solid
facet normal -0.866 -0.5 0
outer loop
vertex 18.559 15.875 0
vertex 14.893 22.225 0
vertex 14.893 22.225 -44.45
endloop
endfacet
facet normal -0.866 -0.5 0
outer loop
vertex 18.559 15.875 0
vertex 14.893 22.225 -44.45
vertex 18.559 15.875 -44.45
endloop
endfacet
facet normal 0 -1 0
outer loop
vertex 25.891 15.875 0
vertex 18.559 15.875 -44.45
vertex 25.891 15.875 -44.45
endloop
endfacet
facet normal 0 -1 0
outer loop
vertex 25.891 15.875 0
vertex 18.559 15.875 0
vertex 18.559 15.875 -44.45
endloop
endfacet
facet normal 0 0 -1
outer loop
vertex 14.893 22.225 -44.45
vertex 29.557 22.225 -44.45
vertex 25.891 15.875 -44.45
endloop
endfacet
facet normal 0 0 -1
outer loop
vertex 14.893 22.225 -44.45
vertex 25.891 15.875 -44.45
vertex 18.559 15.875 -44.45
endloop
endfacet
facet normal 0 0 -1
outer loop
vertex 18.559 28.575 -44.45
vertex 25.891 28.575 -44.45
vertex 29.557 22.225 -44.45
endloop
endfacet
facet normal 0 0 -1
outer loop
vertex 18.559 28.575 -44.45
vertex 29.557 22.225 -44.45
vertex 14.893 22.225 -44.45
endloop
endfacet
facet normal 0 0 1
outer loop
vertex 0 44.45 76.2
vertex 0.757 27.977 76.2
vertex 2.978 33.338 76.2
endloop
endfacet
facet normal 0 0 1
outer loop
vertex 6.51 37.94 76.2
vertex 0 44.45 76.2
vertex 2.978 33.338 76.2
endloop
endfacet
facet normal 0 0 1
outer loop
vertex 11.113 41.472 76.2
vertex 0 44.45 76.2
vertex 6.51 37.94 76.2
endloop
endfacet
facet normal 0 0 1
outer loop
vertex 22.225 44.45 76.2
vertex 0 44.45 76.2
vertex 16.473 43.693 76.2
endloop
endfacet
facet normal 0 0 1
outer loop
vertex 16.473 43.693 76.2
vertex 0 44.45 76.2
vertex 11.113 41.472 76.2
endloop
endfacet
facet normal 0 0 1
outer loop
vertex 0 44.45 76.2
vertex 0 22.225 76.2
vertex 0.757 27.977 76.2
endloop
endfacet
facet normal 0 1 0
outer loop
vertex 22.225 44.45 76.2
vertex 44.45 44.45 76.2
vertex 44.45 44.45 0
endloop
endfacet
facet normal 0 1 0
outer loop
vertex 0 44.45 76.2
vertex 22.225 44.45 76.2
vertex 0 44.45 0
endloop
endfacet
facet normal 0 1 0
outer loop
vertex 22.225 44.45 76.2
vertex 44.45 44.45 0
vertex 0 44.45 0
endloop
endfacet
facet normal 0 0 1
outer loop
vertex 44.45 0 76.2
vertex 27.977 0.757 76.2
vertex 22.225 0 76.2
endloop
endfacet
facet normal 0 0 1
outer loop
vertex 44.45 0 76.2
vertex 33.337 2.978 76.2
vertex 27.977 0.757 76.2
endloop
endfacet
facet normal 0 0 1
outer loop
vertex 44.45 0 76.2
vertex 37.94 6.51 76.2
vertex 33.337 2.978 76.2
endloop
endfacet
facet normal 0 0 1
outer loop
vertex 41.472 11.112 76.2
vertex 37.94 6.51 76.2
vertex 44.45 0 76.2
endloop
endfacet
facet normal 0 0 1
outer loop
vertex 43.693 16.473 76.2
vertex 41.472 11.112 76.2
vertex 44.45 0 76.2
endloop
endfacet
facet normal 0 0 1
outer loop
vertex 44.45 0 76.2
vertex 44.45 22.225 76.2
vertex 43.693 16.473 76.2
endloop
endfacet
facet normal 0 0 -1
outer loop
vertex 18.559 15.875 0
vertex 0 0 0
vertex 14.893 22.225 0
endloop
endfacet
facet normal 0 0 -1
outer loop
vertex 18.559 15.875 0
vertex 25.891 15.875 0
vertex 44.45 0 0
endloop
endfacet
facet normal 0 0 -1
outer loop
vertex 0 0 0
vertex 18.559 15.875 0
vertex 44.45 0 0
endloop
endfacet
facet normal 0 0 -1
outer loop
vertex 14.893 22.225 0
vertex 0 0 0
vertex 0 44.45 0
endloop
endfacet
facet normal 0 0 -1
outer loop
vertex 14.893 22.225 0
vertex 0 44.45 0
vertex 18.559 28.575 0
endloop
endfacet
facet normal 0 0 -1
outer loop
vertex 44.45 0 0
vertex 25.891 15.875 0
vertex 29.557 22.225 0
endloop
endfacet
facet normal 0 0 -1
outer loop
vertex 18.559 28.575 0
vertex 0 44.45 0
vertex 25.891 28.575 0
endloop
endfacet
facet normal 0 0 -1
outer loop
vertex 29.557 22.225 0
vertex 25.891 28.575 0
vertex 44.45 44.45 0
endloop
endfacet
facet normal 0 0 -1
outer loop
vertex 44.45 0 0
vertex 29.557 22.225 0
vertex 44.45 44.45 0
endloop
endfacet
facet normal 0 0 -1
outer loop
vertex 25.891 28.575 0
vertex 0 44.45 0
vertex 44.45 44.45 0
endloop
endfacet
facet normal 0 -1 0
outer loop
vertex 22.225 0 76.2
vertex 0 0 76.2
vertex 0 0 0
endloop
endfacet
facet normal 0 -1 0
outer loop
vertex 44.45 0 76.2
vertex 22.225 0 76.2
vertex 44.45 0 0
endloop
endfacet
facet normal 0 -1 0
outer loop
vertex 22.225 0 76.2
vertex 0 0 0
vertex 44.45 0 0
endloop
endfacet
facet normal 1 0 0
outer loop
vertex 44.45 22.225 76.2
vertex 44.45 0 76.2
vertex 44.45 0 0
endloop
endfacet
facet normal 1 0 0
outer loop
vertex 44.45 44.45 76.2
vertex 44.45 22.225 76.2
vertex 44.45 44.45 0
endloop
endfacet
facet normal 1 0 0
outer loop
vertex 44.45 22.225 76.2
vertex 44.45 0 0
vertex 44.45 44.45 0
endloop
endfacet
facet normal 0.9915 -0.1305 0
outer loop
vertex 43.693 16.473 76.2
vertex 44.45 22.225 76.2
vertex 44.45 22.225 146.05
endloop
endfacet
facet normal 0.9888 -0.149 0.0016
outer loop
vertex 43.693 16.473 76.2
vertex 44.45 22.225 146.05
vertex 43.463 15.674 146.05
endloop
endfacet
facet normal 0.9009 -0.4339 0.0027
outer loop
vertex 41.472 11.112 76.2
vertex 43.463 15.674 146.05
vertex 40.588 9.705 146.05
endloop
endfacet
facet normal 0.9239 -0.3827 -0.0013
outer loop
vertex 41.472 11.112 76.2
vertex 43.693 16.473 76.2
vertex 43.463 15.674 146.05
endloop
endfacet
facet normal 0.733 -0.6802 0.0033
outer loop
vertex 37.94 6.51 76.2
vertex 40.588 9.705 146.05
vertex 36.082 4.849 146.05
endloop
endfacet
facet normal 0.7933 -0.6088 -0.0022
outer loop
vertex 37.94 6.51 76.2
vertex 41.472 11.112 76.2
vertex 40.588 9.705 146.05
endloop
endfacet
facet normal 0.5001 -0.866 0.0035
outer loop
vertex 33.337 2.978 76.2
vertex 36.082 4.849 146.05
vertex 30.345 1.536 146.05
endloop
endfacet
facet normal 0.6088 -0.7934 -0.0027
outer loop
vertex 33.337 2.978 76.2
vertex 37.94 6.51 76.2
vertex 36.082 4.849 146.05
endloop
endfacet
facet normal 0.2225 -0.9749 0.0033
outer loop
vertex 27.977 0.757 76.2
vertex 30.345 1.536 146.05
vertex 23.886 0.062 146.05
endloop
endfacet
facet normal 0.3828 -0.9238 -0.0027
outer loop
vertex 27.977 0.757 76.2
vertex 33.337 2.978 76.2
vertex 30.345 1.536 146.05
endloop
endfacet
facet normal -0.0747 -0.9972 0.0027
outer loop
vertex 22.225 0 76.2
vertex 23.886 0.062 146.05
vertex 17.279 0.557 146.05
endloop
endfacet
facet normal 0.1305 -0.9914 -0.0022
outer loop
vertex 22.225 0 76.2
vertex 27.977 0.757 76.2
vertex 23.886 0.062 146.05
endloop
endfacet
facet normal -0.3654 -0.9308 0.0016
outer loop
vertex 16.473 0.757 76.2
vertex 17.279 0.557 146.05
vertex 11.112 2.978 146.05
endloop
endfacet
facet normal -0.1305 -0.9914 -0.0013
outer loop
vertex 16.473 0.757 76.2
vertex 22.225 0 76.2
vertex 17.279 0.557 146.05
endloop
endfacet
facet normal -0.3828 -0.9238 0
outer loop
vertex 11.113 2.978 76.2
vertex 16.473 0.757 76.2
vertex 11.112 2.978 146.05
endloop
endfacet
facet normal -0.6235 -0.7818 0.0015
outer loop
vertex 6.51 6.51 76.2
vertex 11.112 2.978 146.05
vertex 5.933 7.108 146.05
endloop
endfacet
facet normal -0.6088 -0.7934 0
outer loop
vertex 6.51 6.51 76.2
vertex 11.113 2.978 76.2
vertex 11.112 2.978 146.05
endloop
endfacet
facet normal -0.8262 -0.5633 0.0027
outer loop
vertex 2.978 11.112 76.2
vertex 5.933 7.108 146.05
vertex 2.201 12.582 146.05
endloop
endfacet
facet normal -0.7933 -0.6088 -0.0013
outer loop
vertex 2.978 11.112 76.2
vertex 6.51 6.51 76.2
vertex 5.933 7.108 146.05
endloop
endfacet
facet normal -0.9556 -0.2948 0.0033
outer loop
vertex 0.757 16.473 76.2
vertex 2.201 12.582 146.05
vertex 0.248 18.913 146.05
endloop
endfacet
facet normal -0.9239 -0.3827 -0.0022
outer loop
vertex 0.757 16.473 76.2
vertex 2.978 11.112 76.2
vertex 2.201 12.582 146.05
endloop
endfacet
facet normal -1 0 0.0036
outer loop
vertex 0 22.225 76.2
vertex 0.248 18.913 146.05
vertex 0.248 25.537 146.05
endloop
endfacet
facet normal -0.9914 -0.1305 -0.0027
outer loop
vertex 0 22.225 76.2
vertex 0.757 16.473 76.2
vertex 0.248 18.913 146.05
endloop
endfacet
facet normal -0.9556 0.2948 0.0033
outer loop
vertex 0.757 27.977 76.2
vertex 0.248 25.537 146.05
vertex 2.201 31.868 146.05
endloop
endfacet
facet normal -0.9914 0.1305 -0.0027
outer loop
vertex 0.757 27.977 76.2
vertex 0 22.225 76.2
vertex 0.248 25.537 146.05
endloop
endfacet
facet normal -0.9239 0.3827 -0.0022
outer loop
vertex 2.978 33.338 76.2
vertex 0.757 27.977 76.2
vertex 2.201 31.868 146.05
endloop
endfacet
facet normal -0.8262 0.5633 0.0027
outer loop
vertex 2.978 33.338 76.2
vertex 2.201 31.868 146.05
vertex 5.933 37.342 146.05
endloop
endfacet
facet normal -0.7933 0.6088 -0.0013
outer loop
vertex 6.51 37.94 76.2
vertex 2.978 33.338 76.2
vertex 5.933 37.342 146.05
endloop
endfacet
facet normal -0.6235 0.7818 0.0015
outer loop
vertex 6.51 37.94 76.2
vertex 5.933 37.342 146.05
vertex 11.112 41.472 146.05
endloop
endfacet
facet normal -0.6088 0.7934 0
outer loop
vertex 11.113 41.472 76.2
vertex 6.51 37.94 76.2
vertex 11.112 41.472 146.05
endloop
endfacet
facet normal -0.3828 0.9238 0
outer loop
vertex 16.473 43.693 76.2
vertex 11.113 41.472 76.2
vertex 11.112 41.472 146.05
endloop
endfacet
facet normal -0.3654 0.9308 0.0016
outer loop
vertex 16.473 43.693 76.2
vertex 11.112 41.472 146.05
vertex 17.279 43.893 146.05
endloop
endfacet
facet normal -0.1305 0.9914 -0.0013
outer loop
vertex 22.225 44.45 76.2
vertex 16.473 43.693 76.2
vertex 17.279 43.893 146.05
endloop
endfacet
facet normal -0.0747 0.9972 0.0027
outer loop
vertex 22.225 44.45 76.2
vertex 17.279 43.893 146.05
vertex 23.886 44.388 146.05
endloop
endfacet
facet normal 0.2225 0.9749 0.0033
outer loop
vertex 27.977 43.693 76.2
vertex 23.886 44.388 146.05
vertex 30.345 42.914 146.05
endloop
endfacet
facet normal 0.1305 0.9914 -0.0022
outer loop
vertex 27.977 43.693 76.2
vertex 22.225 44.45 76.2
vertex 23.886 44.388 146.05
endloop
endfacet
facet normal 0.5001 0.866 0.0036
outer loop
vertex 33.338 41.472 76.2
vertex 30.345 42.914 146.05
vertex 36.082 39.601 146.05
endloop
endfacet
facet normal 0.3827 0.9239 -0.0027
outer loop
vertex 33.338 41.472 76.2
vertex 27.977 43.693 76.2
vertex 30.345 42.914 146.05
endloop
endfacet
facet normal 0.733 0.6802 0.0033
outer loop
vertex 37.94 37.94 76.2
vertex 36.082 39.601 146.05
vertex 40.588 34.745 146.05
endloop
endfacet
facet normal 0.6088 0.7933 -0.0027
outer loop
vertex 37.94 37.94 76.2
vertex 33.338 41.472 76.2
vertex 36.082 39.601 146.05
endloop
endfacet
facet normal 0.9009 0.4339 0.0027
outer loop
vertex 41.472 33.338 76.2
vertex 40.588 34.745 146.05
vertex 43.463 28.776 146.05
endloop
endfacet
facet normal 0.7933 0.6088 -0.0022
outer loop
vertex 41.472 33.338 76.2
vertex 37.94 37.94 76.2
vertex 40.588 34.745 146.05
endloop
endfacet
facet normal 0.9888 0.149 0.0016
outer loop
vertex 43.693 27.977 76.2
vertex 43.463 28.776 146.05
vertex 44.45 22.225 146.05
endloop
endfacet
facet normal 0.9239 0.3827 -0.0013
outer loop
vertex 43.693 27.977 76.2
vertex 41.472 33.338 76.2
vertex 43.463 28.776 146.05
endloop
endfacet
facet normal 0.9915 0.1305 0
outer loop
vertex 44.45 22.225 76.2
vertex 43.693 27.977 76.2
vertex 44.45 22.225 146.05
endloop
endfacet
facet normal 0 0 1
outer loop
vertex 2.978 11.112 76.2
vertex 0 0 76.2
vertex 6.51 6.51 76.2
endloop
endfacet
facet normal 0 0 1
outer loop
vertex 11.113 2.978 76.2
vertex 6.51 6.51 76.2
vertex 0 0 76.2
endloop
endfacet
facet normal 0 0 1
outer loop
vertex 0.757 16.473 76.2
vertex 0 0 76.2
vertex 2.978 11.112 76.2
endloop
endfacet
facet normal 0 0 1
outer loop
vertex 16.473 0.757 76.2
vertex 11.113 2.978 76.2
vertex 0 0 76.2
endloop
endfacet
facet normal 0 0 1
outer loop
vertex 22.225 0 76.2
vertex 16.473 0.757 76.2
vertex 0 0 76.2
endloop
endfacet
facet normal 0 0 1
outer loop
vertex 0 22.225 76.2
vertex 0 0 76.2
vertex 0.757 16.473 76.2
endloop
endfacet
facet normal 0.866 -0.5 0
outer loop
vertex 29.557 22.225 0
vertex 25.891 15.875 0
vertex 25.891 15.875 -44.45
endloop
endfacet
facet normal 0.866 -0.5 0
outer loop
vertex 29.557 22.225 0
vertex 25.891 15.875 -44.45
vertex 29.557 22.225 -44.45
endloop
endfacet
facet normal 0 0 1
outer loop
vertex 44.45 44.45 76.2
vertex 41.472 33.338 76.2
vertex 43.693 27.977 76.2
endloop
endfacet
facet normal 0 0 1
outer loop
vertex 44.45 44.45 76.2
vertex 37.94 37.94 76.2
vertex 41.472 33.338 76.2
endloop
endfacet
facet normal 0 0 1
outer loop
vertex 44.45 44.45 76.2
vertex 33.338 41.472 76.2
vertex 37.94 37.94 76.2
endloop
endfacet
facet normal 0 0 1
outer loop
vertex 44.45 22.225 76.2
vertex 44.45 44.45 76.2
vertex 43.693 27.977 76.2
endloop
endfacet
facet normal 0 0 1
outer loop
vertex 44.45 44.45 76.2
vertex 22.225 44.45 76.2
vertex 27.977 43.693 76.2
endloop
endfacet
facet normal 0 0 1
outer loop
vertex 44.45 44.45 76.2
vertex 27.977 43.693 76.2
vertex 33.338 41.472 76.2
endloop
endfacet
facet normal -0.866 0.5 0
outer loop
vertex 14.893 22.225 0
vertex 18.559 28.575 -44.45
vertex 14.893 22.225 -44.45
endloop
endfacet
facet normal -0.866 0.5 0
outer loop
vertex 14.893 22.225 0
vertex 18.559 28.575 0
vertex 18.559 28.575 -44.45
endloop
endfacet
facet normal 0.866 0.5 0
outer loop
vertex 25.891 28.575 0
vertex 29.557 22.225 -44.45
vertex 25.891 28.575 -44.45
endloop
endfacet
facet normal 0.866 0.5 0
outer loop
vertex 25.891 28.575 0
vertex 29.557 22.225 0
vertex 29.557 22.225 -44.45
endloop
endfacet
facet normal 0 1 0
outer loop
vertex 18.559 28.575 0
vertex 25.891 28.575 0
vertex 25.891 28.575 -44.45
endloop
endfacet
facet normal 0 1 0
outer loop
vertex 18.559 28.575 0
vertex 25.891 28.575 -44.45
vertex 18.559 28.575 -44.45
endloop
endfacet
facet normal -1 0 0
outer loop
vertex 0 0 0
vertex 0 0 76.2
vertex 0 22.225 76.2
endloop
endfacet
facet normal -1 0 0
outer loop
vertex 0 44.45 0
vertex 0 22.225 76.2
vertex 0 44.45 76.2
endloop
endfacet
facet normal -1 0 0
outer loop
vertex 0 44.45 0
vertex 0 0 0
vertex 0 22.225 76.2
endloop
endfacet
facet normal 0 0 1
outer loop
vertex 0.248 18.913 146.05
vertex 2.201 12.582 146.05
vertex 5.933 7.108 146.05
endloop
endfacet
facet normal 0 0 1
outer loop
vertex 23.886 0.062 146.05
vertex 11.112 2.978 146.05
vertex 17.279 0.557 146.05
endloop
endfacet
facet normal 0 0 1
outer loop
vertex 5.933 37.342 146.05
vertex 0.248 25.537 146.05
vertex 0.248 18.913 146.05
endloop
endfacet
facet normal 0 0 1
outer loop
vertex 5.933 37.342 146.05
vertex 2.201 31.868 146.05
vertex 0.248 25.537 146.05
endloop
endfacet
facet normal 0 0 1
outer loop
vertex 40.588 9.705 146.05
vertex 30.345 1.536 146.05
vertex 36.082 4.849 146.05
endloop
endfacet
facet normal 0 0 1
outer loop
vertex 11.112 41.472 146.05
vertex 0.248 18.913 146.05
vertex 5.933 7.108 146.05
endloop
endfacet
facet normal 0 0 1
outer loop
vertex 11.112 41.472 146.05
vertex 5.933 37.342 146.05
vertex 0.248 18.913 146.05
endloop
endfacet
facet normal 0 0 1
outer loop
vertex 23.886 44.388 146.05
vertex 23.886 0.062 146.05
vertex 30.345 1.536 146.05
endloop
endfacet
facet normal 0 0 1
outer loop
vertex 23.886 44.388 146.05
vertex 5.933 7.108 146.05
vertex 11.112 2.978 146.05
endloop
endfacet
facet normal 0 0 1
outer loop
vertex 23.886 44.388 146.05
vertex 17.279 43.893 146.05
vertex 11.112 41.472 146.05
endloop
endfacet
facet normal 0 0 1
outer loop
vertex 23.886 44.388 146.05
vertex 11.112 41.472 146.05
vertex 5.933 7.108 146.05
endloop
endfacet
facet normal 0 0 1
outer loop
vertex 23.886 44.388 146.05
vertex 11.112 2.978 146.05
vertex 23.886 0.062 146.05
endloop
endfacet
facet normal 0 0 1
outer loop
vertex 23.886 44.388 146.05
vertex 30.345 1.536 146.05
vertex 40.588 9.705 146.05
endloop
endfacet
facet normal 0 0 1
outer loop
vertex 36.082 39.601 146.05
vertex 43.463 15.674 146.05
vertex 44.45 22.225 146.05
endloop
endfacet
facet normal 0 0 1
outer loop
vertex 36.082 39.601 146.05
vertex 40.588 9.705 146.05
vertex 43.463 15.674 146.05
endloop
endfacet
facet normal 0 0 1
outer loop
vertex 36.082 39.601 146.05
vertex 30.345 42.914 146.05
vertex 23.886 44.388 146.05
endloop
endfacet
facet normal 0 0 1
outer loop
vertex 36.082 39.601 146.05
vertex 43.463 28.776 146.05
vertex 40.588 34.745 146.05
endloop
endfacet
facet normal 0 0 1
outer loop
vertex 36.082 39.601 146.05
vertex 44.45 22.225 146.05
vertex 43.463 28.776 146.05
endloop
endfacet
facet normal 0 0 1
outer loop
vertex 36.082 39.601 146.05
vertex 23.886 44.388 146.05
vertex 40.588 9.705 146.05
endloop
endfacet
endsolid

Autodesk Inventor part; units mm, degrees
ref_plane "YZ Plane" through (0, 0, 0) normal (1, 0, 0) x (0, 1, 0)
ref_plane "XZ Plane" through (0, 0, 0) normal (0, 1, 0) x (-1, 0, 0)
ref_plane "XY Plane" through (0, 0, 0) normal (0, 0, 1) x (1, 0, 0)
sketch "Sketch1" plane through (0, 0, 0) normal (0, 0, 1) x (1, 0, 0)
  line L0 (0, 0) -> (0, 44.45)
  line L1 (0, 0) -> (44.45, 0)
  line L2 (44.45, 0) -> (44.45, 44.45)
  line L3 (44.45, 44.45) -> (0, 44.45)
  dimension "d1" = 44.45
  dimension "d2" = 44.45
extrude "Extrusion1" add sketch "Sketch1" along normal blind 76.2
sketch "Sketch2" plane through (0, 0, 76.2) normal (0, 0, 1) x (1, 0, 0)
  circle A0 centre (22.225, 22.225) radius 22.225
  line L0 (44.45, 44.45) -> (0, 44.45) projected
  line L1 (44.45, 0) -> (44.45, 44.45) projected
  point P0 (0, 0)
  dimension "d5" = 44.45
  dimension "d6" = 22.225
  dimension "d7" = 22.225
extrude "Extrusion2" add sketch "Sketch2" along normal blind 69.85 contours A0
sketch "Sketch3" plane through (0, 0, 0) normal (0, 0, -1) x (-1, 0, 0)
  line L0 (-18.5588, 15.875) -> (-25.8912, 15.875)
  line L1 (-25.8912, 15.875) -> (-29.5573, 22.225)
  line L2 (-29.5573, 22.225) -> (-25.8912, 28.575)
  line L3 (-25.8912, 28.575) -> (-18.5588, 28.575)
  line L4 (-18.5588, 28.575) -> (-14.8927, 22.225)
  line L5 (-14.8927, 22.225) -> (-18.5588, 15.875)
  line L6 (-44.45, 0) -> (0, 0) projected
  line L7 (0, 0) -> (0, 44.45) projected
  point P0 (-22.225, 22.225)
  dimension "d10" = 12.7
  dimension "d11" = 22.225
  dimension "d12" = 22.225
extrude "Extrusion3" add sketch "Sketch3" along normal blind 44.45
properties part number "Bag elevator Motor"
